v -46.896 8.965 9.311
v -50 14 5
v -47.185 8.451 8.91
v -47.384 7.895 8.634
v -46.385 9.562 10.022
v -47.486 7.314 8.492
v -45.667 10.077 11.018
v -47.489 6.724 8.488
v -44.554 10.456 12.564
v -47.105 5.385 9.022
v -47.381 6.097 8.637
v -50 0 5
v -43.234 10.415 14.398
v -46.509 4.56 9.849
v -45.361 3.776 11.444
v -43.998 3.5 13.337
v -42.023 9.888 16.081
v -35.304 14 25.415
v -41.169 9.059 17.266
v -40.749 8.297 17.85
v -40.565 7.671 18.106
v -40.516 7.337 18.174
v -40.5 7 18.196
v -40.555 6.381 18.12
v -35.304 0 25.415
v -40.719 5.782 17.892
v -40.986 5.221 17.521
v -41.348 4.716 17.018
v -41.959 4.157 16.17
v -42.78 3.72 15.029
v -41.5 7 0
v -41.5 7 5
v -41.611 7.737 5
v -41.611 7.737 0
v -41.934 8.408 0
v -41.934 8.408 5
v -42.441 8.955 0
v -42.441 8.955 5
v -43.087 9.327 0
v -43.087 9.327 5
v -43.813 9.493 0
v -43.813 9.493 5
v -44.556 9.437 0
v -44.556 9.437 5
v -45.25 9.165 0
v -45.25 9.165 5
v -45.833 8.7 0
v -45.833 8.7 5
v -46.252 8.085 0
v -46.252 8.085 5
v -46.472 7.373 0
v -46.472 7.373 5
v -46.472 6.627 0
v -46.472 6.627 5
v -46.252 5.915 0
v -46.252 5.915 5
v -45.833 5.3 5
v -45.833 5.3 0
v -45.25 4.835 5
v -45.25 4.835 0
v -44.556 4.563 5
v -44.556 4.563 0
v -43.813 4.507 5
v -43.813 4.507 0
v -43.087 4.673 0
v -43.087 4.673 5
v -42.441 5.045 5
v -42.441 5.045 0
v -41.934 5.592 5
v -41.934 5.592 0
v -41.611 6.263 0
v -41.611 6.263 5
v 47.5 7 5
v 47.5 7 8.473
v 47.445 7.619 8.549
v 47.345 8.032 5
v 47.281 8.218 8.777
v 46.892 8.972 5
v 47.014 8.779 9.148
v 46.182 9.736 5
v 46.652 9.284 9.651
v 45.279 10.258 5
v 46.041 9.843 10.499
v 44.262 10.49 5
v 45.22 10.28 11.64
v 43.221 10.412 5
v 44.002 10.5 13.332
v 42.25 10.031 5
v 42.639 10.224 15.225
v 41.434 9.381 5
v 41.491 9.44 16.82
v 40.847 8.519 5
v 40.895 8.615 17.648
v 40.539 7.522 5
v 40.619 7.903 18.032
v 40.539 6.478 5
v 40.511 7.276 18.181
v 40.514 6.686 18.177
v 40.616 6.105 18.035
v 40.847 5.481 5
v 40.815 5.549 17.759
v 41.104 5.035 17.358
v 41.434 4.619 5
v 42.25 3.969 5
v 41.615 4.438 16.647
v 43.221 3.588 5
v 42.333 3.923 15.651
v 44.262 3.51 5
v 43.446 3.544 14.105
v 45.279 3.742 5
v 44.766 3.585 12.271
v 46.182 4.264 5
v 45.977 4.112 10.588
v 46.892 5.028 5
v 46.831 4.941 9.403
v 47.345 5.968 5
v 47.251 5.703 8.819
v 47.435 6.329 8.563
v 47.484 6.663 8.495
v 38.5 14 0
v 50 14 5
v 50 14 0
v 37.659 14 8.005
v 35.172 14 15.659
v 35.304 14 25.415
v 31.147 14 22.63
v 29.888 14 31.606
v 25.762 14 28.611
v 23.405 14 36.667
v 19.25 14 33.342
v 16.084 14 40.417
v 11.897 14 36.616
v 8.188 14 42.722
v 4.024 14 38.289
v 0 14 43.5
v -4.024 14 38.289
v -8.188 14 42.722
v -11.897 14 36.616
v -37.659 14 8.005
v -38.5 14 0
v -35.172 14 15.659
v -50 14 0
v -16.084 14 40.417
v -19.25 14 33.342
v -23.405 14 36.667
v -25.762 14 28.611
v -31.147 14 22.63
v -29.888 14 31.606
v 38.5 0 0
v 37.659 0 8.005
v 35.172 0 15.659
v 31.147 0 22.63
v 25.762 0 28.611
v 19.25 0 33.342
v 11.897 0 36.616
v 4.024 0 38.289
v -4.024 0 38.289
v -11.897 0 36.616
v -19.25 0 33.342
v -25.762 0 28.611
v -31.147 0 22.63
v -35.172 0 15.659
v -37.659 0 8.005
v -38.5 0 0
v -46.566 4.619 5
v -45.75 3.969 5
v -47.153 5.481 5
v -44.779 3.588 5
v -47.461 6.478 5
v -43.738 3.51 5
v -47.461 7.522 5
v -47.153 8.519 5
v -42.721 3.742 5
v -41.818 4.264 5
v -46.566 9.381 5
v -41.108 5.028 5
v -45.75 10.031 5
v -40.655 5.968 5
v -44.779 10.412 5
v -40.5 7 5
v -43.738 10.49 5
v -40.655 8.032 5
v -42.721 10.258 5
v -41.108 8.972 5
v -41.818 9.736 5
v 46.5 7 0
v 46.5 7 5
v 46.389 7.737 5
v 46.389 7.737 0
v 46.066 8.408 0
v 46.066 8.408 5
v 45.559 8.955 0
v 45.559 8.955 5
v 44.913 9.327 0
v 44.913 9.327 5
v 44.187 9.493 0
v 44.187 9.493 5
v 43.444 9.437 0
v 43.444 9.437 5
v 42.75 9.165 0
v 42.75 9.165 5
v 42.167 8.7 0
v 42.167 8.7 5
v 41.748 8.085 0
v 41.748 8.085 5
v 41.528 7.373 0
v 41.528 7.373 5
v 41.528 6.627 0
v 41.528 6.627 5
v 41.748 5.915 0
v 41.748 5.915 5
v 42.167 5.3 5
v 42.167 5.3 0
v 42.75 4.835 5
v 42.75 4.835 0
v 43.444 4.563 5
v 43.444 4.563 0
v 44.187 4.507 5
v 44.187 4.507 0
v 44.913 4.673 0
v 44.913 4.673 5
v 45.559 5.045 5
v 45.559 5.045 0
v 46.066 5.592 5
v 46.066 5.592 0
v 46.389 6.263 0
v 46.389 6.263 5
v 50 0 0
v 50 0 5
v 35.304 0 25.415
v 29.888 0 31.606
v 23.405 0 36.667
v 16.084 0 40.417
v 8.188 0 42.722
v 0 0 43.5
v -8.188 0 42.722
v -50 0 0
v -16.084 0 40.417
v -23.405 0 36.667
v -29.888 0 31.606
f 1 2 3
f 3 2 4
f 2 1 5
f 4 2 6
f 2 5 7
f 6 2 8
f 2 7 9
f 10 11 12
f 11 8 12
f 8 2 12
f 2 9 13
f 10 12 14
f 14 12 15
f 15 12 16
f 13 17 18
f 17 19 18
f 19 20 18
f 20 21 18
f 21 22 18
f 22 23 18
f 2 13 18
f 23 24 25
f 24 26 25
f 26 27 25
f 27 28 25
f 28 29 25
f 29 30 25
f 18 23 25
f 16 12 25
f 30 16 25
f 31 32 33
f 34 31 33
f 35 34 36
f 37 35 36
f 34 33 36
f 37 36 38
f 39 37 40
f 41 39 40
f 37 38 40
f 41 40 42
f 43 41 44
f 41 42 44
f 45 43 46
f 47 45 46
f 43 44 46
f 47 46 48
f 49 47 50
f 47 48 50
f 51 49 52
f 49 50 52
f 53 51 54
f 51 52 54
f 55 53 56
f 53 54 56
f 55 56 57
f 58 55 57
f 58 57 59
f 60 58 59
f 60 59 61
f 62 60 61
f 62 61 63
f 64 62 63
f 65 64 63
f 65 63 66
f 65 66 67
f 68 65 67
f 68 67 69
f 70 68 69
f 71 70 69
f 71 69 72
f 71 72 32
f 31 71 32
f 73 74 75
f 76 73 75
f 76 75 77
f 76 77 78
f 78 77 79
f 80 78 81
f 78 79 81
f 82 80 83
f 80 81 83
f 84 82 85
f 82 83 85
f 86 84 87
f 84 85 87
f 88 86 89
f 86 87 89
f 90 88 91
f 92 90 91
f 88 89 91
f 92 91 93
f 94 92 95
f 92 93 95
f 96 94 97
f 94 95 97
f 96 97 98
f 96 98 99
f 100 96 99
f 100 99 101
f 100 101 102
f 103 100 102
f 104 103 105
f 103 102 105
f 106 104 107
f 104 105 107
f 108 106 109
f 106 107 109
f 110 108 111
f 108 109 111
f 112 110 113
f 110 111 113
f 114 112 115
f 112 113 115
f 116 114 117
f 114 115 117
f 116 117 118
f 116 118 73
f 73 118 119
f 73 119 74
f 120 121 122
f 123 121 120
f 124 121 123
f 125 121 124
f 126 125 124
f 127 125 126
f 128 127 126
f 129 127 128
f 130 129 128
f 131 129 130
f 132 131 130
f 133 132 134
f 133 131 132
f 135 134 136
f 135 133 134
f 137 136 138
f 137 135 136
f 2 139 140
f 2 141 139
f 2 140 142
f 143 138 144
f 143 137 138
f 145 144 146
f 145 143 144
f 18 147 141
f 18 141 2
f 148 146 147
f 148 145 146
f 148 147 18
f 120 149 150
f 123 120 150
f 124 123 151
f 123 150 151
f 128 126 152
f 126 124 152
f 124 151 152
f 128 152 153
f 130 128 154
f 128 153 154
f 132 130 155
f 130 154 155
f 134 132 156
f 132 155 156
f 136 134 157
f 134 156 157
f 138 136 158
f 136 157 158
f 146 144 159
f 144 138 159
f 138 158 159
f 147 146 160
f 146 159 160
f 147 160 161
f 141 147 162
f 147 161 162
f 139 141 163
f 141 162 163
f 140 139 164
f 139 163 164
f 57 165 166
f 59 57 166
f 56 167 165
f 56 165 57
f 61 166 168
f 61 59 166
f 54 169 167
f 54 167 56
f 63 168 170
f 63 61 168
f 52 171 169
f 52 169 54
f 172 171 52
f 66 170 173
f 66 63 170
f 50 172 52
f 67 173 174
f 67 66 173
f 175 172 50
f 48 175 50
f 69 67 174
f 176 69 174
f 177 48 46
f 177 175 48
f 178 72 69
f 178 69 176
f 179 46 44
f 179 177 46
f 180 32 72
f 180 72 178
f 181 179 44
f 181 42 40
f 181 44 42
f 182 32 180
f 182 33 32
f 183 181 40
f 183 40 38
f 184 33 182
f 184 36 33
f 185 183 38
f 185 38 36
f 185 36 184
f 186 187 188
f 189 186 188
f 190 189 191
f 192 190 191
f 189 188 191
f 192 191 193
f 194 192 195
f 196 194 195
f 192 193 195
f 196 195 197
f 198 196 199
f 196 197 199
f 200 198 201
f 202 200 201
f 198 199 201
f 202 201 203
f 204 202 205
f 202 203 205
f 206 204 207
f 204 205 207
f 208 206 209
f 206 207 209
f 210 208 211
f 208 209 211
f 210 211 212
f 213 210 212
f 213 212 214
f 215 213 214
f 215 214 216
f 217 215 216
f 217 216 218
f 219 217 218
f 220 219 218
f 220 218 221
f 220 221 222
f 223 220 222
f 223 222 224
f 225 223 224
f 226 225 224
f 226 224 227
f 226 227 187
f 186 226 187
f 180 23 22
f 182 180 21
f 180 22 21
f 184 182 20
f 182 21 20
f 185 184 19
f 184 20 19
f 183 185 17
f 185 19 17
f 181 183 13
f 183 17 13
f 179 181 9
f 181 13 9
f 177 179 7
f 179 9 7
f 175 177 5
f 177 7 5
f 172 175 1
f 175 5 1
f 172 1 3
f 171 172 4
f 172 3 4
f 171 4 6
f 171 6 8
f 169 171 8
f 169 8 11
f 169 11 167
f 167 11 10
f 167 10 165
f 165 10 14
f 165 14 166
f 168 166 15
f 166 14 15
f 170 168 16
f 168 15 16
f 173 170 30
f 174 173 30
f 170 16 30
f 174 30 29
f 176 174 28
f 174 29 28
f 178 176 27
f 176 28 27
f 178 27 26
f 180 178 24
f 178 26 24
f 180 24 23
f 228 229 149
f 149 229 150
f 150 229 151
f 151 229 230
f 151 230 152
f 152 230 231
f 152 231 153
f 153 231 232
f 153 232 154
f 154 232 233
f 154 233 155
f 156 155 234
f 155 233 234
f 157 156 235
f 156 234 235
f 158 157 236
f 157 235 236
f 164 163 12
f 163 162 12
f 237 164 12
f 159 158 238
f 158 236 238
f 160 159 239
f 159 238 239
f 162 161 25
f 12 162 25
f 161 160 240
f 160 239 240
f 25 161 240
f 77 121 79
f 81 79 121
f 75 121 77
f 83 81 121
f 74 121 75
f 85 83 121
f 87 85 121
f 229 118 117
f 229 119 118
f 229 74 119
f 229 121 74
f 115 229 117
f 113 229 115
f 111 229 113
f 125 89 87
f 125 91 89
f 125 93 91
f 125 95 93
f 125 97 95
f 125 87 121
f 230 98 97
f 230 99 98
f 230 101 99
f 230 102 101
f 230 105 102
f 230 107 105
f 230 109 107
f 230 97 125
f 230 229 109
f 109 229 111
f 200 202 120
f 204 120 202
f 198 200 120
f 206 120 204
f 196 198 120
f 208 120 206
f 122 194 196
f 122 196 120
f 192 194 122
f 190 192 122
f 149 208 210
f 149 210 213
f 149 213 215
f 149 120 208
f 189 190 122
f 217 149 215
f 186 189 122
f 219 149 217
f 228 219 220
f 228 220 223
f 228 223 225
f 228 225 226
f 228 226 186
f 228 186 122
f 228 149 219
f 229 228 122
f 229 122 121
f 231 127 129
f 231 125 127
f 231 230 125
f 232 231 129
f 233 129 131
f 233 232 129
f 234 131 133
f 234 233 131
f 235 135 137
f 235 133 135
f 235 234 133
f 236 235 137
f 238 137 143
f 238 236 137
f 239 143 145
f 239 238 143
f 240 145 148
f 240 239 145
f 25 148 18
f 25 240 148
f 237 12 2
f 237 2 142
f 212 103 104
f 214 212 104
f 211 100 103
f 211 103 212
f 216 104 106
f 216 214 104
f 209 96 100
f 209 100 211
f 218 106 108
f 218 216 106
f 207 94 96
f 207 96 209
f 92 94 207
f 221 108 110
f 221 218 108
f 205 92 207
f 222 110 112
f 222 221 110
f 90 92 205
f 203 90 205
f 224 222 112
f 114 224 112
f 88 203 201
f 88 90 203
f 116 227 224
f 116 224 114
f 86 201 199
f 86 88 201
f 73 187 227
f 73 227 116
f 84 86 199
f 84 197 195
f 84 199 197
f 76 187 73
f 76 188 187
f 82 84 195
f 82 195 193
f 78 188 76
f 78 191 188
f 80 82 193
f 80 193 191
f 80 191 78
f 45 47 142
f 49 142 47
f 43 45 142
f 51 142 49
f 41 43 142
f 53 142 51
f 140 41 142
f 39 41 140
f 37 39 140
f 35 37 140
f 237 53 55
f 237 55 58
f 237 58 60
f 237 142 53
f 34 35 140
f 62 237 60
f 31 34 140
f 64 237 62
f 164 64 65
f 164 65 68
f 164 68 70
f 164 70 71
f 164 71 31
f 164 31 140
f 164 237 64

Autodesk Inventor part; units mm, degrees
ref_plane "YZ Plane" through (0, 0, 0) normal (1, 0, 0) x (0, 1, 0)
ref_plane "XZ Plane" through (0, 0, 0) normal (0, 1, 0) x (-1, 0, 0)
sketch "Sketch2" plane through (0, 0, 0) normal (0, 1, 0) x (-1, 0, 0)
  line L0 (-50, 0) -> (-50, 5)
  line L1 (50, 5) -> (50, 0)
  arc A0 (38.5, 0) -> (-38.5, 0) centre (0, 0) ccw
  line L2 (50, 5) -> (35.3035, 25.4148)
  line L3 (-50, 5) -> (-35.3035, 25.4148)
  line L4 (50, 0) -> (38.5, 0)
  line L5 (-38.5, 0) -> (-50, 0)
  line L6 (43.2117, 5) -> (50, 5)
  arc A1 (35.3035, 25.4148) -> (-35.3035, 25.4148) centre (0, 0) ccw
  point P0 (50, 2.5)
  dimension "d0" = 77
  dimension "d2" = 5
  dimension "d3" = 100
  dimension "d4" = 50
extrude "Extrusion1" add sketch "Sketch2" along normal blind 14
ref_plane "Work Plane1" through (0, 0, 50) normal (0, 0, 1) x (1, 0, 0)
sketch "Sketch3" plane through (0, 0, 50) normal (0, 0, 1) x (1, 0, 0)
  line L0 (-38.5, 0) -> (-38.5, 14) projected
  circle A0 centre (44, 7) radius 2.5
  circle A1 centre (44, 7) radius 3.5
  line L1 (0, 0) -> (0, 17.8681)
  circle A2 centre (-44, 7) radius 2.5
  circle A3 centre (-44, 7) radius 3.5
  line L2 (35.3035, 14) -> (50, 14) projected
  dimension "d10" = 1
  dimension "d11" = 44
  dimension "d12" = 7
extrude "Extrusion2" cut sketch "Sketch3" against normal blind 45
extrude "Extrusion3" cut sketch "Sketch3" against normal blind 60 contours A0 | A2
properties part number "clamp" material "Polyethylene, High Density"
